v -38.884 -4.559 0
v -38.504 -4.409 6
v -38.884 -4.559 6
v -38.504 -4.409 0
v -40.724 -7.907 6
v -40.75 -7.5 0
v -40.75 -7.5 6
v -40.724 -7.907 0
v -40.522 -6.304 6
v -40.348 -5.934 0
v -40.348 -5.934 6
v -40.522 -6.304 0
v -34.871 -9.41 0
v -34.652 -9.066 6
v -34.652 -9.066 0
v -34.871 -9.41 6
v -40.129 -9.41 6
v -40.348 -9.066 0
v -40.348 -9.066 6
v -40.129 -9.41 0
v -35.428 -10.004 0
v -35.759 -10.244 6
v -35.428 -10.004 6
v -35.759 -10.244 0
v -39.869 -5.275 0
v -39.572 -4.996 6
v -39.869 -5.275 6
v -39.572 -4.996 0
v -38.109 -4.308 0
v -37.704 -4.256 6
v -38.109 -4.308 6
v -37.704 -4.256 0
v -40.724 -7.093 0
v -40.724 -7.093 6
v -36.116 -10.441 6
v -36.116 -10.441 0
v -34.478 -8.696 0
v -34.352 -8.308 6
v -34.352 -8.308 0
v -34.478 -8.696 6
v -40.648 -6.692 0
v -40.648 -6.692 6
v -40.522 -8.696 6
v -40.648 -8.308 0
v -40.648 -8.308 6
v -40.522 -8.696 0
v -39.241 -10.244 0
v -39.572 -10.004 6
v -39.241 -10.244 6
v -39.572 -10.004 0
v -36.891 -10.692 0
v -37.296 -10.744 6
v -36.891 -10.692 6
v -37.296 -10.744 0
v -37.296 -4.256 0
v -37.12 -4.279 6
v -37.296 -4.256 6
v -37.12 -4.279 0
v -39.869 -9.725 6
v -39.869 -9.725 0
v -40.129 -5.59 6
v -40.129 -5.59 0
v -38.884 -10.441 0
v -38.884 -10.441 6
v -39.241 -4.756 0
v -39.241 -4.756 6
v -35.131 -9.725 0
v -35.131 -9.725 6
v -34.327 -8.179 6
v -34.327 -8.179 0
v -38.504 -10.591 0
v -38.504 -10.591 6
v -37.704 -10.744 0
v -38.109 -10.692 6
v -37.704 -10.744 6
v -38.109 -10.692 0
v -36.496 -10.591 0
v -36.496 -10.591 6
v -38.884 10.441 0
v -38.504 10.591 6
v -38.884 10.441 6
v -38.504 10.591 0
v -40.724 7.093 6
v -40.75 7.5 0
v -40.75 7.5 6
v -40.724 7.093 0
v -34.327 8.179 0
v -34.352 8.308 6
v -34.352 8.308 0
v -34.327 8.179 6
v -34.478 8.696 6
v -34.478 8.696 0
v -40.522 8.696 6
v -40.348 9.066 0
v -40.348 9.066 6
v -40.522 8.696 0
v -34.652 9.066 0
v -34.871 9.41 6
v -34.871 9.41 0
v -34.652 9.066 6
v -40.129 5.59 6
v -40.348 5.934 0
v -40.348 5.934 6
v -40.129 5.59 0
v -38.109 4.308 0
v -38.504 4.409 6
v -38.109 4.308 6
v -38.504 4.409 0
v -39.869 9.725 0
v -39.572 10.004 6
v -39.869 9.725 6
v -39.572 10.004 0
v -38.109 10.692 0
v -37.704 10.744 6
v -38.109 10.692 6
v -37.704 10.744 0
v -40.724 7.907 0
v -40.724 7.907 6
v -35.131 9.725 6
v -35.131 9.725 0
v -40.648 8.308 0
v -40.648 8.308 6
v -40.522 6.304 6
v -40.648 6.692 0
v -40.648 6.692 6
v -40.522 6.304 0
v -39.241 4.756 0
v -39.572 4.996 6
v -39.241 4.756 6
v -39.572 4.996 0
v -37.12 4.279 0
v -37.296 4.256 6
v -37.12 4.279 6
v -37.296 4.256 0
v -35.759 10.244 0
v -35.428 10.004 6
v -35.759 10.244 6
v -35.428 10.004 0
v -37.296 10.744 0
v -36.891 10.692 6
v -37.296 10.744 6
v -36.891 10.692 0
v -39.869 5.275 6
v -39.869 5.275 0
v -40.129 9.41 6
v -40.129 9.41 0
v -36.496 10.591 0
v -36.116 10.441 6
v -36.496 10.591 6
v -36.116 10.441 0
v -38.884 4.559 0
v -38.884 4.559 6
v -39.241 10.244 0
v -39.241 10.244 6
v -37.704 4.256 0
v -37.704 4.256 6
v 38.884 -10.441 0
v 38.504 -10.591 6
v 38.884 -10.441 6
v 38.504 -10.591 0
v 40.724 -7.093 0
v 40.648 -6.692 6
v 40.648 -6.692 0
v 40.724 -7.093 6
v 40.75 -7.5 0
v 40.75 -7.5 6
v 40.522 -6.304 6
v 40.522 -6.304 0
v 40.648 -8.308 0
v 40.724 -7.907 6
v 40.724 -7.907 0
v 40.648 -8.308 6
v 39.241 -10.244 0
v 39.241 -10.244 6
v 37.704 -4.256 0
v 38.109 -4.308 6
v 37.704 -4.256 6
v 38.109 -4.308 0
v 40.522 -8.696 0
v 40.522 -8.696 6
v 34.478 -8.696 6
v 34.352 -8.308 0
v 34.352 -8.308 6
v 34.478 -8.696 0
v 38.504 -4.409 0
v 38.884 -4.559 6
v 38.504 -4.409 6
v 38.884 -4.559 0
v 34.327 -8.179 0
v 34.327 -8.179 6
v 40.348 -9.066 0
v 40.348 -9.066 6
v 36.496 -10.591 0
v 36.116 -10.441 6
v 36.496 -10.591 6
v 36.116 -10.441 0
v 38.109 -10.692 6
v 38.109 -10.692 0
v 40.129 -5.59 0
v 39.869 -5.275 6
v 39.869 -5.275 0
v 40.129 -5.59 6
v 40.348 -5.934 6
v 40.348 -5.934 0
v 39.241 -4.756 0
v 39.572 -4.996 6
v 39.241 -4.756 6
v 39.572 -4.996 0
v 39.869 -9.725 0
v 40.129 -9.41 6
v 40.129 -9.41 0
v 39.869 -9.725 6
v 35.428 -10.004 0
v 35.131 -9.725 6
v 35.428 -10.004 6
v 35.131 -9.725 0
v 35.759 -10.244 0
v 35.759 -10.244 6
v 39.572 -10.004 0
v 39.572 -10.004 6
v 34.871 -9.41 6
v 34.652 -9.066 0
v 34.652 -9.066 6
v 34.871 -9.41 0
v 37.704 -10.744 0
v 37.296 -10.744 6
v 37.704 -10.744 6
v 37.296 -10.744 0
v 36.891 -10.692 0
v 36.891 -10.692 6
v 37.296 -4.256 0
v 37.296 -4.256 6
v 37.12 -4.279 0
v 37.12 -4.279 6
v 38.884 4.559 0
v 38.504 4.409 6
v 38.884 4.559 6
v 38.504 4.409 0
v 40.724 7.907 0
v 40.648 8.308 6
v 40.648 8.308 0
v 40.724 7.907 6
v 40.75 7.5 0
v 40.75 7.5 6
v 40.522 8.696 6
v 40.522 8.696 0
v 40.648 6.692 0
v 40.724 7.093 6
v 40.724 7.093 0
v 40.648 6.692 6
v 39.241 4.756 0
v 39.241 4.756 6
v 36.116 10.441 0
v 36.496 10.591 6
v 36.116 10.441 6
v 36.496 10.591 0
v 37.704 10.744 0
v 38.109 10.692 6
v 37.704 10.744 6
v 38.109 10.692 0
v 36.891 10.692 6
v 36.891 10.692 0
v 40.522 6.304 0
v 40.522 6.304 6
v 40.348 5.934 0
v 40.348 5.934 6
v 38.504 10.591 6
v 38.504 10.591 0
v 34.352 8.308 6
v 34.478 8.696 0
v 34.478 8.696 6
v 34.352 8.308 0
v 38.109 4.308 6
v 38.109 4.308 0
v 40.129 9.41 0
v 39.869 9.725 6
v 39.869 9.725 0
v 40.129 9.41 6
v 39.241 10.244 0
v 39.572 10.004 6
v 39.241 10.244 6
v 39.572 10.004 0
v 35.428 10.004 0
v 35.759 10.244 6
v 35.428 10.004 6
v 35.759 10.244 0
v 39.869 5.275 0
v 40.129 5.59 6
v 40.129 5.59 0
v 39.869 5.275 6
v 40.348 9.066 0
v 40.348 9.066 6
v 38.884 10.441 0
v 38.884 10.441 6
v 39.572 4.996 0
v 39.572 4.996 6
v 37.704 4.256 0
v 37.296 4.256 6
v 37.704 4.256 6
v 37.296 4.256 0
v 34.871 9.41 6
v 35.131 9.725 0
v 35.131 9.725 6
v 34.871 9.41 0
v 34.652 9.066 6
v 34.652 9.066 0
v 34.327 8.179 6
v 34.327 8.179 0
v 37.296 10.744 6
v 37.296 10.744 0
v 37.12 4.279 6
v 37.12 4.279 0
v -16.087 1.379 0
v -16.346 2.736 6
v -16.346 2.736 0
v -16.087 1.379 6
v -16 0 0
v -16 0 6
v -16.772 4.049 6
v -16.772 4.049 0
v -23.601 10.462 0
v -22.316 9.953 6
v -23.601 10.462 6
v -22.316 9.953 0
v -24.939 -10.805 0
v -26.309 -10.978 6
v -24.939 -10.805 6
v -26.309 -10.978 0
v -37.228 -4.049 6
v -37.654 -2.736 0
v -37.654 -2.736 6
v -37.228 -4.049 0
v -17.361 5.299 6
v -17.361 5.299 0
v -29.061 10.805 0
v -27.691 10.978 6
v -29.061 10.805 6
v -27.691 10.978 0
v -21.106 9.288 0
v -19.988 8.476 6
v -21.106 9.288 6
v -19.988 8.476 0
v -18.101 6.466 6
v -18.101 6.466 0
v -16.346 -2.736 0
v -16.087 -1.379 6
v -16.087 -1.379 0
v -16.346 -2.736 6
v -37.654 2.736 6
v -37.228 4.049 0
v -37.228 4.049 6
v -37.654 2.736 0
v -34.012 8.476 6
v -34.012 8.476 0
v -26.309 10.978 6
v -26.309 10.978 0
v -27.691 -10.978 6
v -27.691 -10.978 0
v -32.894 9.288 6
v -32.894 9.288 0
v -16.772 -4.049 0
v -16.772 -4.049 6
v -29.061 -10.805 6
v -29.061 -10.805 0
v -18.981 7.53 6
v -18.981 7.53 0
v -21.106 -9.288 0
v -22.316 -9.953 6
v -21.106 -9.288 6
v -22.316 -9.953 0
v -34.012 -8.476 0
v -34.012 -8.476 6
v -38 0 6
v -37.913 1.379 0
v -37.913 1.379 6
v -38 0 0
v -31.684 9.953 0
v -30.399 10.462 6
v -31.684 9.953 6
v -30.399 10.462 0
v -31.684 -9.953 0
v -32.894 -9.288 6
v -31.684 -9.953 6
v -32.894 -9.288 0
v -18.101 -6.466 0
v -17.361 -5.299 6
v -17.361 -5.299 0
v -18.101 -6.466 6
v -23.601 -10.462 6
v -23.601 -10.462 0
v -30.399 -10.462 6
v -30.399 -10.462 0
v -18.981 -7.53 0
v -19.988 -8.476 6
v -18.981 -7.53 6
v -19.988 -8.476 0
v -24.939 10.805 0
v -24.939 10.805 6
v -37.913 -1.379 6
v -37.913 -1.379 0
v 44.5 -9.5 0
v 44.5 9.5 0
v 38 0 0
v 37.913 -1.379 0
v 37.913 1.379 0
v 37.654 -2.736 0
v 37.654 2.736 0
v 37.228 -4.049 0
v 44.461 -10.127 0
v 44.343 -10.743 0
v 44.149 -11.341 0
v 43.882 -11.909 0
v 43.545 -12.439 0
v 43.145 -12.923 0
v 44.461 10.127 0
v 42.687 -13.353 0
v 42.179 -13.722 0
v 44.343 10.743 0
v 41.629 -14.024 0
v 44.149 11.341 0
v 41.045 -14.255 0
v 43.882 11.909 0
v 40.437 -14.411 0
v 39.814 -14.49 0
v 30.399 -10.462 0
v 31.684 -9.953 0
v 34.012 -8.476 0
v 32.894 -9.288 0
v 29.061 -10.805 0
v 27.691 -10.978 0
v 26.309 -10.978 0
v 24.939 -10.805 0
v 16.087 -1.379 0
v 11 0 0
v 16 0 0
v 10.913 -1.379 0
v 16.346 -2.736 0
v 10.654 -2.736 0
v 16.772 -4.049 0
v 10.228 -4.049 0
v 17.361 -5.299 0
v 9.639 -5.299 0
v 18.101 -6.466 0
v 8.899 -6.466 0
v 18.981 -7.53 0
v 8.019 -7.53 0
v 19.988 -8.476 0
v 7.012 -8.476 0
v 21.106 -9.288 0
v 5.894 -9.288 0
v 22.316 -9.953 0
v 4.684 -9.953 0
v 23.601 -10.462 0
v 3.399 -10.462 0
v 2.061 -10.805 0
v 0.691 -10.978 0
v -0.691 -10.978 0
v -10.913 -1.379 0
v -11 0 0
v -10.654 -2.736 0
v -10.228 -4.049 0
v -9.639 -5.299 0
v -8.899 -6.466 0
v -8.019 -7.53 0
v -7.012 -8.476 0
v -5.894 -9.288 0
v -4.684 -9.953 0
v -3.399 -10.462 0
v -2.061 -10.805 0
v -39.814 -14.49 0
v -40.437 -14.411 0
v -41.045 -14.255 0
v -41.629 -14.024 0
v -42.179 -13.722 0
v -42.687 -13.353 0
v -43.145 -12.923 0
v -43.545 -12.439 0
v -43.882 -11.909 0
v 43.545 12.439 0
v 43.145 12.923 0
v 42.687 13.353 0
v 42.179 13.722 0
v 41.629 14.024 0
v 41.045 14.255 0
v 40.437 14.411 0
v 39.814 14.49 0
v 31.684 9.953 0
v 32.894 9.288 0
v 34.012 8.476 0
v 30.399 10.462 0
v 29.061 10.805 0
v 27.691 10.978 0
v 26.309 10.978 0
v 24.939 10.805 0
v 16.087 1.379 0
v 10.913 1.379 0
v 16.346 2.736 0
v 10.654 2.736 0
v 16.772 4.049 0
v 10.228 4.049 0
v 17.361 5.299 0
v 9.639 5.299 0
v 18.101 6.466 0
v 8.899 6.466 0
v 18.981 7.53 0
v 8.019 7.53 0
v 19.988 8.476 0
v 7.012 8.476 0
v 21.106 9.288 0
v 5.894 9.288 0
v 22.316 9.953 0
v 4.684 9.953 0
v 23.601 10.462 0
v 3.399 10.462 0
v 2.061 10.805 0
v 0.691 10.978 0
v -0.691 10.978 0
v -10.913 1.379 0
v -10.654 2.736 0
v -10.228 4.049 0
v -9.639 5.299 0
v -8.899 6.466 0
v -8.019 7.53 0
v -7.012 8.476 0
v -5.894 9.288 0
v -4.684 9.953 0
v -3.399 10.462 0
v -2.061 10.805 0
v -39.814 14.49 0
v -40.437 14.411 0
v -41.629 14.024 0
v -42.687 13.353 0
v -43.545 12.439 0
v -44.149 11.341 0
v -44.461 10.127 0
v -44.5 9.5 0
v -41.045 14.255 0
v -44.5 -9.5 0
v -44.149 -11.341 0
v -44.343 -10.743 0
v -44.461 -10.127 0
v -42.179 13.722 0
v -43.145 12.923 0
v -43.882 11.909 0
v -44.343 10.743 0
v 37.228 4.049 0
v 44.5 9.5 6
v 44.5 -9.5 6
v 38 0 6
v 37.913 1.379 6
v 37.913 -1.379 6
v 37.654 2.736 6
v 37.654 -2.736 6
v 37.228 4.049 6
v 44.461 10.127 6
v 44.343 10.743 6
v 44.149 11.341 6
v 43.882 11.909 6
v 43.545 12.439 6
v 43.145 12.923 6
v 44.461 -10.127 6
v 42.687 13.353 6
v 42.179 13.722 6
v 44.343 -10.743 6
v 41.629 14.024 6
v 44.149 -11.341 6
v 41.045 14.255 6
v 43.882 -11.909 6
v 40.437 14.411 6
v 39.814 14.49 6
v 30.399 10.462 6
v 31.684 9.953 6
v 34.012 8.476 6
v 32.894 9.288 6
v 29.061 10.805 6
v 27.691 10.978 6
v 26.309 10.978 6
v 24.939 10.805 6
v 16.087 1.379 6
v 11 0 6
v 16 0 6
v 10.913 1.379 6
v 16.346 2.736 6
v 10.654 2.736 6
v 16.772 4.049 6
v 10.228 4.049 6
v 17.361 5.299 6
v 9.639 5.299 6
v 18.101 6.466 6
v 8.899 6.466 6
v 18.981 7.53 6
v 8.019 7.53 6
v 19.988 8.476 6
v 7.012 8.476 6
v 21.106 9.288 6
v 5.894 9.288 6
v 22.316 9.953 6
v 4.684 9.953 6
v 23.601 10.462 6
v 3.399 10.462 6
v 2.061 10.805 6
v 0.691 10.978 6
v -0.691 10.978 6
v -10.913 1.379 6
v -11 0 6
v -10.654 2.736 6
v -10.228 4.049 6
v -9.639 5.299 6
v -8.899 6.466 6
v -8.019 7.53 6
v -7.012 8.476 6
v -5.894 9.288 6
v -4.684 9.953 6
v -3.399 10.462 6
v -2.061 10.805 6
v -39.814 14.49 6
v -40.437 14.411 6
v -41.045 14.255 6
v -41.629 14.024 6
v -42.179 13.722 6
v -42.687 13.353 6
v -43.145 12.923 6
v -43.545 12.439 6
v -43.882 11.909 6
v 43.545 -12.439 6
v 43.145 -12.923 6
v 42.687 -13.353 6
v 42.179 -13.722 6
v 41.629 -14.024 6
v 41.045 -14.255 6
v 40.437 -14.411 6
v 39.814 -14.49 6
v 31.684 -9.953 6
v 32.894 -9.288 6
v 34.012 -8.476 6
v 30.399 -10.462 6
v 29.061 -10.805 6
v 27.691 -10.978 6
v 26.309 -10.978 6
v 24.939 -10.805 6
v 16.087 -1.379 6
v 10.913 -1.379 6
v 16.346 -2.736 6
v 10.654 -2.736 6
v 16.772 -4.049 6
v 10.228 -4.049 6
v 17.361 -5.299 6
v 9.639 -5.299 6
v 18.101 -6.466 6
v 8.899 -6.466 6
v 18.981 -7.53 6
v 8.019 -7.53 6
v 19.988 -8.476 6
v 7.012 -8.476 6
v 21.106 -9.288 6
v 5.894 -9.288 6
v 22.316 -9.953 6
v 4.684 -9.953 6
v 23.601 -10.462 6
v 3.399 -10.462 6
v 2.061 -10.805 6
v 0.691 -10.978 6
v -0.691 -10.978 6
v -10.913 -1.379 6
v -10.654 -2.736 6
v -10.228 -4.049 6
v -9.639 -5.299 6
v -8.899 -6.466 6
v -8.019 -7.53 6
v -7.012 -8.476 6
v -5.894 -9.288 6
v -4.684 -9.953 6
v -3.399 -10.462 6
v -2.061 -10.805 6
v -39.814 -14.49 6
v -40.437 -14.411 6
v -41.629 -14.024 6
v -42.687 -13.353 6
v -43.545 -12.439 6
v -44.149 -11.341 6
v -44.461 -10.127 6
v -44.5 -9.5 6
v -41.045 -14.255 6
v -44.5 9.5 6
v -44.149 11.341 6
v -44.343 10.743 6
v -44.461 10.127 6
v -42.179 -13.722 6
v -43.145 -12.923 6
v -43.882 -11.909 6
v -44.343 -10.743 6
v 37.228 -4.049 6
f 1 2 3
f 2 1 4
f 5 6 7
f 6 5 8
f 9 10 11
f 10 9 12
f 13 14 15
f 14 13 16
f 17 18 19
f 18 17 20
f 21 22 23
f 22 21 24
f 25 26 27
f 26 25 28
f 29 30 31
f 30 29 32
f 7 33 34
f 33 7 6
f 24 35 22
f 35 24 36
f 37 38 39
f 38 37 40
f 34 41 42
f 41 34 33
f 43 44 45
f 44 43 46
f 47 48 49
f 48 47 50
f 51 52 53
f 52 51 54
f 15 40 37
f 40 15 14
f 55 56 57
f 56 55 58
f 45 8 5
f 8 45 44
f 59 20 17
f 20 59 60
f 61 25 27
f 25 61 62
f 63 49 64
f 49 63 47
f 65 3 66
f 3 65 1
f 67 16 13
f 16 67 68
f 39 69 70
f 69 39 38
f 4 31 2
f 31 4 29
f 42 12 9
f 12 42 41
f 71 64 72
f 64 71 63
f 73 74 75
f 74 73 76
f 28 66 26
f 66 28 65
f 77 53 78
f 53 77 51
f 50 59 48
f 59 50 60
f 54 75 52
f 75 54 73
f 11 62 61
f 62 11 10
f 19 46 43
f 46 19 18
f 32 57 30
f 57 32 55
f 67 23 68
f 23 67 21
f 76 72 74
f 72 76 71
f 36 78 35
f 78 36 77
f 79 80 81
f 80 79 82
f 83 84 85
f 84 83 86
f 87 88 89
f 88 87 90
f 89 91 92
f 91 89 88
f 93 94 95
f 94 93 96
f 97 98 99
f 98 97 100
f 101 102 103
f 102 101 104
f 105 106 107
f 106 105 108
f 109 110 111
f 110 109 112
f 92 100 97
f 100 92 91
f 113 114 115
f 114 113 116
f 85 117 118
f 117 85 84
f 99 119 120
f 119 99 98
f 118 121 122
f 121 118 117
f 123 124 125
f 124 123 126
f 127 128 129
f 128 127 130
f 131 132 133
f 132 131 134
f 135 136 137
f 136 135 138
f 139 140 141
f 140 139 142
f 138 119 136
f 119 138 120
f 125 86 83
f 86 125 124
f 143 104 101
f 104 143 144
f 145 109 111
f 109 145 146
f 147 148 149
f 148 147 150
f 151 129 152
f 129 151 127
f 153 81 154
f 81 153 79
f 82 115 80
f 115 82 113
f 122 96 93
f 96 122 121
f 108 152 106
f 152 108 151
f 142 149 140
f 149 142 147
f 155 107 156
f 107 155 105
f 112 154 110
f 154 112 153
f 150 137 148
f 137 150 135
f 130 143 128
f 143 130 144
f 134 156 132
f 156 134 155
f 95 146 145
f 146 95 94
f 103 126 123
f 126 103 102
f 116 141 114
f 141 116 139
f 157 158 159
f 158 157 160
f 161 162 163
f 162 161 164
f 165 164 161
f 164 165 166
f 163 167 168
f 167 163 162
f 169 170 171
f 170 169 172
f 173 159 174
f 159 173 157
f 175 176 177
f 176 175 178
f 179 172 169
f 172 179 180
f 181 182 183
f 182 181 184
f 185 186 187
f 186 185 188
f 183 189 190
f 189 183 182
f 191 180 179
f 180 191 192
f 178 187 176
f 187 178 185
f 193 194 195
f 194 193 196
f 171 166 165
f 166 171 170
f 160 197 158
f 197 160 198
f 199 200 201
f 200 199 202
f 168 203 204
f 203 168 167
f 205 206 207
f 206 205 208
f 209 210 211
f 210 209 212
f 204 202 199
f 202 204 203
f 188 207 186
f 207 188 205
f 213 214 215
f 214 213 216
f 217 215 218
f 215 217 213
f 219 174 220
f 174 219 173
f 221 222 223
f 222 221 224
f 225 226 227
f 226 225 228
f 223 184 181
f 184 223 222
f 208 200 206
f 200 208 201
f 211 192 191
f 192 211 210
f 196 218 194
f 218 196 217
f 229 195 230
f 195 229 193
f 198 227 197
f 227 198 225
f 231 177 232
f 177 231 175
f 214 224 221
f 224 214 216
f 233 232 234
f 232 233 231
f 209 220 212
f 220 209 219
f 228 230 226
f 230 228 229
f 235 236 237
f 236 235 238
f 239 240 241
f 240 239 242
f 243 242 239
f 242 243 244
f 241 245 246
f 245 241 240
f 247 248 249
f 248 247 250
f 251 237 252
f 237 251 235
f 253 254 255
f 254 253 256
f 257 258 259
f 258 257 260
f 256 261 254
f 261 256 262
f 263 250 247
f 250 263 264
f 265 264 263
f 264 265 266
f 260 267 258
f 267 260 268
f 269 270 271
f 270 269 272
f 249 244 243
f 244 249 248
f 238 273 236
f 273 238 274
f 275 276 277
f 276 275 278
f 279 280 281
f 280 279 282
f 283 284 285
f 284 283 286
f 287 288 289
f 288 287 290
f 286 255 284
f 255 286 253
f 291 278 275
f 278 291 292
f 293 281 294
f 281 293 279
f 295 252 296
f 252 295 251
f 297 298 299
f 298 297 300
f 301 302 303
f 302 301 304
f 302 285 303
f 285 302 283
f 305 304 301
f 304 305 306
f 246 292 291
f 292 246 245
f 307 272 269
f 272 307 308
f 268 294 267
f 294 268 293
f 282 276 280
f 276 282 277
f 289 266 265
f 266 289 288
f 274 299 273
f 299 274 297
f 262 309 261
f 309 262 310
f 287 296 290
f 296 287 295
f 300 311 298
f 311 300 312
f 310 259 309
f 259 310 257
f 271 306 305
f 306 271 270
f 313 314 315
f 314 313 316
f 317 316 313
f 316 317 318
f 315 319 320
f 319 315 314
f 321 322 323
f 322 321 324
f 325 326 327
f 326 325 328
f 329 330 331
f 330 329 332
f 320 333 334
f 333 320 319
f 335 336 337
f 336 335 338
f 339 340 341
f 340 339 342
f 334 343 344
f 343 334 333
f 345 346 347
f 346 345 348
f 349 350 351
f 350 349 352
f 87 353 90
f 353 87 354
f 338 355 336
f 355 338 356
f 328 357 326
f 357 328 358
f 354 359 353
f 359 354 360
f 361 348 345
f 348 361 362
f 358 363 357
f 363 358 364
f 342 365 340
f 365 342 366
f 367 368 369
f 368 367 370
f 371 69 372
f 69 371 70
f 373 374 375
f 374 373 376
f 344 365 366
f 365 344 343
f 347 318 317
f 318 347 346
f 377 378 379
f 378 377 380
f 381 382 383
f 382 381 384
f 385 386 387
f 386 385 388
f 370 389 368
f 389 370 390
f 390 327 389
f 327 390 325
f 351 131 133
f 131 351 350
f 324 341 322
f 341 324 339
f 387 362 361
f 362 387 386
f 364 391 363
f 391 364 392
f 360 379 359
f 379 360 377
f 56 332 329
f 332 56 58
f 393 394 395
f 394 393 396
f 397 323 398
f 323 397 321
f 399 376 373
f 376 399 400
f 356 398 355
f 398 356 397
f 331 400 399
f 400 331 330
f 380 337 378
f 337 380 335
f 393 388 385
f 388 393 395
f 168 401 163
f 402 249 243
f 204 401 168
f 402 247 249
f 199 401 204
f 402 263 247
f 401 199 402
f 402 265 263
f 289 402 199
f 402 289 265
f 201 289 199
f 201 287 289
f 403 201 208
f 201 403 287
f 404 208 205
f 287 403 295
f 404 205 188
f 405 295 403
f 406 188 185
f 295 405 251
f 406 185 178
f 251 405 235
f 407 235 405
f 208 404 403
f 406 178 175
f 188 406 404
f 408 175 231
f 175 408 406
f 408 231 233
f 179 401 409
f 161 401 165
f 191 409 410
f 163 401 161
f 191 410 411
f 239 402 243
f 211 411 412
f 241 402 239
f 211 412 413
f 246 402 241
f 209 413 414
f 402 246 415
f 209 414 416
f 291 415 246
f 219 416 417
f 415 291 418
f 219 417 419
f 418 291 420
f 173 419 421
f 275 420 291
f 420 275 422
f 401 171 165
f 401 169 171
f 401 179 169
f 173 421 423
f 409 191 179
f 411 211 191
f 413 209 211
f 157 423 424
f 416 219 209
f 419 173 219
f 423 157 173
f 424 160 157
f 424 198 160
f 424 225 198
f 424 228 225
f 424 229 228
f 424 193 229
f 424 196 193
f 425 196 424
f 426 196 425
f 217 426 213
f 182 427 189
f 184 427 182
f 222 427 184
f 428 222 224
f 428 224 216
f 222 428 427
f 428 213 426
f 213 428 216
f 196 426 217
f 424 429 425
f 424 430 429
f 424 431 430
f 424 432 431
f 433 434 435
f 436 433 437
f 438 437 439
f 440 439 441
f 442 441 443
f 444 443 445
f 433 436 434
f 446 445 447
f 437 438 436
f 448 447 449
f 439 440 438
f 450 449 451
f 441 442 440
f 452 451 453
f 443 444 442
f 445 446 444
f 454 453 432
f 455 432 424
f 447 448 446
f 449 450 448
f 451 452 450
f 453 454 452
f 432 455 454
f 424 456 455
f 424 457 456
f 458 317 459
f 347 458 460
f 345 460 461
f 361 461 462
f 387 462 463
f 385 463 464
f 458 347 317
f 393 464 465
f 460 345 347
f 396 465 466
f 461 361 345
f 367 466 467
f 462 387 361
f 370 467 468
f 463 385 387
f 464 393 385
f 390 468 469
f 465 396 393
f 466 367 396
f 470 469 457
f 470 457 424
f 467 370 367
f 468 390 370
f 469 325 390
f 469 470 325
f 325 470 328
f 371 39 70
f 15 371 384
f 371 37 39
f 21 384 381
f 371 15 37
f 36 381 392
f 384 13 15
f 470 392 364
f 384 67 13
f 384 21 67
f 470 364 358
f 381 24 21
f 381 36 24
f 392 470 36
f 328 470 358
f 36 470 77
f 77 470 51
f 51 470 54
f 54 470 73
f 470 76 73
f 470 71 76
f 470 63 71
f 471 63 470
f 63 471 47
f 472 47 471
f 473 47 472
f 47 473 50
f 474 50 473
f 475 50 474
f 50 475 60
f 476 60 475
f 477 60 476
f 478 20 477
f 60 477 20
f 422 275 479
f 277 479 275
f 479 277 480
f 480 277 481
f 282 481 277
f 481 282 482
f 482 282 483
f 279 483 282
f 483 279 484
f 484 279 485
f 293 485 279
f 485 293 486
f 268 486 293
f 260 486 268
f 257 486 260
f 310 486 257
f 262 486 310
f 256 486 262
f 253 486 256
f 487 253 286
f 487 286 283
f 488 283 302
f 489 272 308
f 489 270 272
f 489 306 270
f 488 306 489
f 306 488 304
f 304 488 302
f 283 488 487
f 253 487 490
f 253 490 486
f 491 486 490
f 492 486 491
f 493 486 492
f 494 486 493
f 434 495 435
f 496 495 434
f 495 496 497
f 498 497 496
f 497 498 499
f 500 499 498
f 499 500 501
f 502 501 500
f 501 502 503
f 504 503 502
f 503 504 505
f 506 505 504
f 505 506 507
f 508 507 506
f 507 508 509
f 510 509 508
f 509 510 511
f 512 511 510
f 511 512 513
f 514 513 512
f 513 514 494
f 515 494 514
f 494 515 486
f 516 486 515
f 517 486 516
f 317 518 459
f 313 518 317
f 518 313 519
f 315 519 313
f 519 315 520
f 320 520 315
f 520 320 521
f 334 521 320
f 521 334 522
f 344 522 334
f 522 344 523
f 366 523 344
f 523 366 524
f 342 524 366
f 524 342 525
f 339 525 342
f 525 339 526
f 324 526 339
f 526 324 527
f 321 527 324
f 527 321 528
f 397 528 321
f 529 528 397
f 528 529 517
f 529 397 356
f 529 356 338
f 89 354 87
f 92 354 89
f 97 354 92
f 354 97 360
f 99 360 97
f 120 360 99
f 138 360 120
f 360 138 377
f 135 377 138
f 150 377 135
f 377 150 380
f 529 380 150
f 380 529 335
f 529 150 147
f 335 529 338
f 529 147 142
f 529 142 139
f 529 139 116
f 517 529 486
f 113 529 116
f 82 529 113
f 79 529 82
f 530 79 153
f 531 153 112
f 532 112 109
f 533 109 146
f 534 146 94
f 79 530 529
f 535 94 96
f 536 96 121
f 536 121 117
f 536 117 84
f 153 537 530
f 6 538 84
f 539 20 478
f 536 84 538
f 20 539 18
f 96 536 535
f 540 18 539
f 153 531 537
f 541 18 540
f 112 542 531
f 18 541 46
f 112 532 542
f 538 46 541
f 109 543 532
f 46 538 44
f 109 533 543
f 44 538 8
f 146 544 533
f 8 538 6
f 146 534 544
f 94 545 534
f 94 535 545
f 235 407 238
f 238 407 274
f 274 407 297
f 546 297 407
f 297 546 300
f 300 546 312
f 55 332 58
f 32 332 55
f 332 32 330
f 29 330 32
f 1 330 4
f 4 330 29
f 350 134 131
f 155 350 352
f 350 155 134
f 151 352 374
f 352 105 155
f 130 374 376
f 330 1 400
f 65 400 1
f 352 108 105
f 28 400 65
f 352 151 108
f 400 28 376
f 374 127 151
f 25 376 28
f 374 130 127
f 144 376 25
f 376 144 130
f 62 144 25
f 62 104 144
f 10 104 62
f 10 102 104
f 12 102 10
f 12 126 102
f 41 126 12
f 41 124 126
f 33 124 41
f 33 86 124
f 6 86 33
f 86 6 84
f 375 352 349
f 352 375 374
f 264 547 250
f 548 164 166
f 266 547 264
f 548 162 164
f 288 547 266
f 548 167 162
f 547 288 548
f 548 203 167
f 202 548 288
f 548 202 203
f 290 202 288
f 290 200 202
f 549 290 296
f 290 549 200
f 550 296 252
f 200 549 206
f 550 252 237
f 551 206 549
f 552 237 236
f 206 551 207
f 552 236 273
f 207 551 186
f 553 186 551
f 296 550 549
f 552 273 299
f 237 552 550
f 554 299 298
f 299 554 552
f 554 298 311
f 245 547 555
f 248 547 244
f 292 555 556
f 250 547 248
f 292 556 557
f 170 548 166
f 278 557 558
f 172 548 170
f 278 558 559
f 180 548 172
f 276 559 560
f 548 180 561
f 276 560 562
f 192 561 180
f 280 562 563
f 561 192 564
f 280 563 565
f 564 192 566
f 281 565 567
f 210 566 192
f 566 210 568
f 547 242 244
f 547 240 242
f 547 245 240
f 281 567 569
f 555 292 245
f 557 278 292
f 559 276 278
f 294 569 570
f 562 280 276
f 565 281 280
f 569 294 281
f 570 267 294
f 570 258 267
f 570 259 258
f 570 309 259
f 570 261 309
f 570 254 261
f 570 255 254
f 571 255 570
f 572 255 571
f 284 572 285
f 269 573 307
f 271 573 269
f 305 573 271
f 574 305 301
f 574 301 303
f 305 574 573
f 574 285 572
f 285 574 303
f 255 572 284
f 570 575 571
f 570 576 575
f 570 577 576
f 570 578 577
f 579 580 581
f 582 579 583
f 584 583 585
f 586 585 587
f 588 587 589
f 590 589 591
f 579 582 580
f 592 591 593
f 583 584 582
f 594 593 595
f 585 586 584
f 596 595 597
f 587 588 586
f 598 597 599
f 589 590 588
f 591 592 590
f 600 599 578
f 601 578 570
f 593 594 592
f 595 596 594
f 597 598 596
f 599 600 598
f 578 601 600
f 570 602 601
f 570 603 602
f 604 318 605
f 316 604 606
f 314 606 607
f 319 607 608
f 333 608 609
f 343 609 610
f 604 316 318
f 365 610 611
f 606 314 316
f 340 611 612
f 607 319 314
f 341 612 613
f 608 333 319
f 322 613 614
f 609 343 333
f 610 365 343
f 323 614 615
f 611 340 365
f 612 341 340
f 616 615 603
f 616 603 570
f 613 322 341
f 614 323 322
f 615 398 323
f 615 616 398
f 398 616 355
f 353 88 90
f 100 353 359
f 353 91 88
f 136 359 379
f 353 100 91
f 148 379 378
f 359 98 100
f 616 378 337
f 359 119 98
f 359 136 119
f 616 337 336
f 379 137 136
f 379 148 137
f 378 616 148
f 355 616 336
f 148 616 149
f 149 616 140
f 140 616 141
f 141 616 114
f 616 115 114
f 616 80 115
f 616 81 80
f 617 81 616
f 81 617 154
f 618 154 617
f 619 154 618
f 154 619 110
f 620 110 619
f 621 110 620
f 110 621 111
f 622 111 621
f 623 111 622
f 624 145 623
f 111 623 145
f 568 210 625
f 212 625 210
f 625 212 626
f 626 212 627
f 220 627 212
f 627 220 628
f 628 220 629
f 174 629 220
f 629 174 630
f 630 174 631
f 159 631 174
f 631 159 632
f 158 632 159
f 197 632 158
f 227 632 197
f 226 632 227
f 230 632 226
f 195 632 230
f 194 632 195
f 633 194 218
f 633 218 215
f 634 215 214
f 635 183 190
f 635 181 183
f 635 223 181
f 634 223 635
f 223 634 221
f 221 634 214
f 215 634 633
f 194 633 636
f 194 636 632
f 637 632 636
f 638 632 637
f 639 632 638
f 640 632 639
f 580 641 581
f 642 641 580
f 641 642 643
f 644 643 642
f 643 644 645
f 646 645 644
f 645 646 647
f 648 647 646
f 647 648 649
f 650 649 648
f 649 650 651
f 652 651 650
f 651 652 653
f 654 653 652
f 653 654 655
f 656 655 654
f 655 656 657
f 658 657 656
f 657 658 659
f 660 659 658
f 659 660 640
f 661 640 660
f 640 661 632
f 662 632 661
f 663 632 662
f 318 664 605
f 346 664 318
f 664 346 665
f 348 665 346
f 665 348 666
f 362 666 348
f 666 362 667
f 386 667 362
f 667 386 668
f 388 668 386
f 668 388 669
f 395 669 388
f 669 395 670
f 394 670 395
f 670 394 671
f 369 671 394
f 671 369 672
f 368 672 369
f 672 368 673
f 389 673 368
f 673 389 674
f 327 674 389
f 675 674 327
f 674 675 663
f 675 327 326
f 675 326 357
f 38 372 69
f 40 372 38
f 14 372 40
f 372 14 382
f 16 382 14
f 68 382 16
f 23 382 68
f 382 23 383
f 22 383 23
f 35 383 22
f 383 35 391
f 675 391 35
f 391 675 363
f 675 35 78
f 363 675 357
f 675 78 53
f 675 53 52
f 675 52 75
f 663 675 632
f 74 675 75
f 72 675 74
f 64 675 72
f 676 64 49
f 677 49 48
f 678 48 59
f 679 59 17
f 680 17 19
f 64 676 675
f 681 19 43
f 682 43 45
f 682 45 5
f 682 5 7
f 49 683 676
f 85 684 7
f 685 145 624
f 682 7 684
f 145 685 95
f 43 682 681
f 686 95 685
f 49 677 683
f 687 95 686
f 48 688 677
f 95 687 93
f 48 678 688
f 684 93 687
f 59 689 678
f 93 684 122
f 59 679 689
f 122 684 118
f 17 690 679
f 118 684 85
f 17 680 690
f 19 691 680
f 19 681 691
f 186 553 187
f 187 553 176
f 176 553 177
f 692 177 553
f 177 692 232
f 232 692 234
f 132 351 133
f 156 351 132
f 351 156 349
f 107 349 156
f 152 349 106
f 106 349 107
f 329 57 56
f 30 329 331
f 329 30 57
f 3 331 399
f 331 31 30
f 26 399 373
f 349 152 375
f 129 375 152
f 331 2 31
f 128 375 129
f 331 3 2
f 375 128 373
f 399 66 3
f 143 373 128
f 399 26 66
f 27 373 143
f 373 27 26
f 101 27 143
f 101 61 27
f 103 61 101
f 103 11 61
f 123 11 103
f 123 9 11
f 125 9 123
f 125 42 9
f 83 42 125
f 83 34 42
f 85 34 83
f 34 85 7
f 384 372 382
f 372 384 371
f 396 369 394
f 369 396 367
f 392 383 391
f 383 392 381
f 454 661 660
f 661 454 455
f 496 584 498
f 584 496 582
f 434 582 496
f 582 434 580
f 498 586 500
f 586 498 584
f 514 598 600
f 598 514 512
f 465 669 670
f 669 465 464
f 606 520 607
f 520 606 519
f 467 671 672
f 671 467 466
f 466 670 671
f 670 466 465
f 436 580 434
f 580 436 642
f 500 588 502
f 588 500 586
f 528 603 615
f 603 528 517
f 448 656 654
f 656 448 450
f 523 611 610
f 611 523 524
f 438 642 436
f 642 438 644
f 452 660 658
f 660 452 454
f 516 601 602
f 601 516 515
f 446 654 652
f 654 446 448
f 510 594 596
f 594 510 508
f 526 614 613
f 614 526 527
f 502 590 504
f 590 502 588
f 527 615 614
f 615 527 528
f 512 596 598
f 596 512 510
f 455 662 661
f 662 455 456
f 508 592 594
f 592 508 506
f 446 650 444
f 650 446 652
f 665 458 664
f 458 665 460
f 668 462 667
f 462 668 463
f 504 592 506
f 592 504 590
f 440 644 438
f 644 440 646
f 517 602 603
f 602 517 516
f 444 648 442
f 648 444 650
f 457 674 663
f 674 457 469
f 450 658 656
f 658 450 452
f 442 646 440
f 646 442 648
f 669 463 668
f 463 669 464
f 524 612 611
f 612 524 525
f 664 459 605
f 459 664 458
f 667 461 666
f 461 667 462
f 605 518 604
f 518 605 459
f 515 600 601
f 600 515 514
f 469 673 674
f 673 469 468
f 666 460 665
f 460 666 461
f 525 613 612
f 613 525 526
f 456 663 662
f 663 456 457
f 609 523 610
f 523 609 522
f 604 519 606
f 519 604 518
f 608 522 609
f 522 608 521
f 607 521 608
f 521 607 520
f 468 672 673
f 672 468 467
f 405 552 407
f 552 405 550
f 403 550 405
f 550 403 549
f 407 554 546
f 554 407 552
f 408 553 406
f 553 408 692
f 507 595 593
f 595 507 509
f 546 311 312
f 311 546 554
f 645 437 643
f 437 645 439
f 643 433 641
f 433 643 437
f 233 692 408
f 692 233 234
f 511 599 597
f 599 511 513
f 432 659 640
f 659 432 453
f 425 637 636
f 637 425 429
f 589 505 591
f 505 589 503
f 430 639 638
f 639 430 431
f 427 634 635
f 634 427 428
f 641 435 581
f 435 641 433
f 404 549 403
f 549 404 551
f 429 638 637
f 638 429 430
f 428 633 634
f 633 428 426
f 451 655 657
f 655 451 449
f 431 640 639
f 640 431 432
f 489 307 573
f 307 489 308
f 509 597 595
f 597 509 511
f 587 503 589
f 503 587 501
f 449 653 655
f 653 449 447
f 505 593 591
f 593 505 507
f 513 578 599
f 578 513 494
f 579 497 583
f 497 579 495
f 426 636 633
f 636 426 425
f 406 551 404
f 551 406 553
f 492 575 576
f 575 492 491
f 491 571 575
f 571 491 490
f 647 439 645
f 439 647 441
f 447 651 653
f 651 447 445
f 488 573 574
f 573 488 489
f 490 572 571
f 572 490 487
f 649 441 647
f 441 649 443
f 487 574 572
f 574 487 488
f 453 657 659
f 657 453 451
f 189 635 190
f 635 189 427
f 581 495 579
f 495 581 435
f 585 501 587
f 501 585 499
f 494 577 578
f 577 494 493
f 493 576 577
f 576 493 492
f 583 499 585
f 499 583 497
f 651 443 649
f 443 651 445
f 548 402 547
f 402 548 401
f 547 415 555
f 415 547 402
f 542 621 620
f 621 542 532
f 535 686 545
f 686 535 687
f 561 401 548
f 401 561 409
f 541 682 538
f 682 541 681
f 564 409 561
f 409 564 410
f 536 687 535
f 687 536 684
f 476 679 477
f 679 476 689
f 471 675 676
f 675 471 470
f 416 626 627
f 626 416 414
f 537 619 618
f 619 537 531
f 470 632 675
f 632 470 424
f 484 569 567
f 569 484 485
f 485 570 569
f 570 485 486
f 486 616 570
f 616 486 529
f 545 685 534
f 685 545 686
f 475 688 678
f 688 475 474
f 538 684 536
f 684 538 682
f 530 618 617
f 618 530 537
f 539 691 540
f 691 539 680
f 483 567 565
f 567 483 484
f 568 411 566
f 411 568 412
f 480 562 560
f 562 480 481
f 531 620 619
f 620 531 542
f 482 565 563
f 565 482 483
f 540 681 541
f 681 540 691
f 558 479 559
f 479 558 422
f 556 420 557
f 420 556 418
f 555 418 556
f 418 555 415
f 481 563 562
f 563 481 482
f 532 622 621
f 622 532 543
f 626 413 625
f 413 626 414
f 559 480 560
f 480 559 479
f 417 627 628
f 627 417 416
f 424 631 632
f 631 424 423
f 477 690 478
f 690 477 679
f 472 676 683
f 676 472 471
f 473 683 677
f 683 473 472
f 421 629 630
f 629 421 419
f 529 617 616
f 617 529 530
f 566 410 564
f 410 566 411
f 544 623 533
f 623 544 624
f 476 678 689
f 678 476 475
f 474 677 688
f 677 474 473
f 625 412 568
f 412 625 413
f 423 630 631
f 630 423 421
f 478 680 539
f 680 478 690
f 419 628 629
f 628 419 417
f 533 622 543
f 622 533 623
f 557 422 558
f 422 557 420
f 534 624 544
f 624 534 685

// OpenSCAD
$fn = 50;

difference() {
	union() {
		hull() {
			translate(v = [-39.5, 9.5, 0]) {
				cylinder(h = 6, r = 5);
			}
			translate(v = [39.5, 9.5, 0]) {
				cylinder(h = 6, r = 5);
			}
			translate(v = [-39.5, -9.5, 0]) {
				cylinder(h = 6, r = 5);
			}
			translate(v = [39.5, -9.5, 0]) {
				cylinder(h = 6, r = 5);
			}
		}
	}
	union() {
		translate(v = [-37.5, -7.5, -100.0]) {
			cylinder(h = 200, r = 3.25);
		}
		translate(v = [-37.5, 7.5, -100.0]) {
			cylinder(h = 200, r = 3.25);
		}
		translate(v = [37.5, -7.5, -100.0]) {
			cylinder(h = 200, r = 3.25);
		}
		translate(v = [37.5, 7.5, -100.0]) {
			cylinder(h = 200, r = 3.25);
		}
		translate(v = [-37.5, -7.5, -100.0]) {
			cylinder(h = 200, r = 1.8);
		}
		translate(v = [-37.5, 7.5, -100.0]) {
			cylinder(h = 200, r = 1.8);
		}
		translate(v = [37.5, -7.5, -100.0]) {
			cylinder(h = 200, r = 1.8);
		}
		translate(v = [37.5, 7.5, -100.0]) {
			cylinder(h = 200, r = 1.8);
		}
		translate(v = [-27.0, 0, 0.0]) {
			cylinder(h = 6, r = 11.0);
		}
		cylinder(h = 6, r = 11.0);
		translate(v = [27.0, 0, 0.0]) {
			cylinder(h = 6, r = 11.0);
		}
	}
}
